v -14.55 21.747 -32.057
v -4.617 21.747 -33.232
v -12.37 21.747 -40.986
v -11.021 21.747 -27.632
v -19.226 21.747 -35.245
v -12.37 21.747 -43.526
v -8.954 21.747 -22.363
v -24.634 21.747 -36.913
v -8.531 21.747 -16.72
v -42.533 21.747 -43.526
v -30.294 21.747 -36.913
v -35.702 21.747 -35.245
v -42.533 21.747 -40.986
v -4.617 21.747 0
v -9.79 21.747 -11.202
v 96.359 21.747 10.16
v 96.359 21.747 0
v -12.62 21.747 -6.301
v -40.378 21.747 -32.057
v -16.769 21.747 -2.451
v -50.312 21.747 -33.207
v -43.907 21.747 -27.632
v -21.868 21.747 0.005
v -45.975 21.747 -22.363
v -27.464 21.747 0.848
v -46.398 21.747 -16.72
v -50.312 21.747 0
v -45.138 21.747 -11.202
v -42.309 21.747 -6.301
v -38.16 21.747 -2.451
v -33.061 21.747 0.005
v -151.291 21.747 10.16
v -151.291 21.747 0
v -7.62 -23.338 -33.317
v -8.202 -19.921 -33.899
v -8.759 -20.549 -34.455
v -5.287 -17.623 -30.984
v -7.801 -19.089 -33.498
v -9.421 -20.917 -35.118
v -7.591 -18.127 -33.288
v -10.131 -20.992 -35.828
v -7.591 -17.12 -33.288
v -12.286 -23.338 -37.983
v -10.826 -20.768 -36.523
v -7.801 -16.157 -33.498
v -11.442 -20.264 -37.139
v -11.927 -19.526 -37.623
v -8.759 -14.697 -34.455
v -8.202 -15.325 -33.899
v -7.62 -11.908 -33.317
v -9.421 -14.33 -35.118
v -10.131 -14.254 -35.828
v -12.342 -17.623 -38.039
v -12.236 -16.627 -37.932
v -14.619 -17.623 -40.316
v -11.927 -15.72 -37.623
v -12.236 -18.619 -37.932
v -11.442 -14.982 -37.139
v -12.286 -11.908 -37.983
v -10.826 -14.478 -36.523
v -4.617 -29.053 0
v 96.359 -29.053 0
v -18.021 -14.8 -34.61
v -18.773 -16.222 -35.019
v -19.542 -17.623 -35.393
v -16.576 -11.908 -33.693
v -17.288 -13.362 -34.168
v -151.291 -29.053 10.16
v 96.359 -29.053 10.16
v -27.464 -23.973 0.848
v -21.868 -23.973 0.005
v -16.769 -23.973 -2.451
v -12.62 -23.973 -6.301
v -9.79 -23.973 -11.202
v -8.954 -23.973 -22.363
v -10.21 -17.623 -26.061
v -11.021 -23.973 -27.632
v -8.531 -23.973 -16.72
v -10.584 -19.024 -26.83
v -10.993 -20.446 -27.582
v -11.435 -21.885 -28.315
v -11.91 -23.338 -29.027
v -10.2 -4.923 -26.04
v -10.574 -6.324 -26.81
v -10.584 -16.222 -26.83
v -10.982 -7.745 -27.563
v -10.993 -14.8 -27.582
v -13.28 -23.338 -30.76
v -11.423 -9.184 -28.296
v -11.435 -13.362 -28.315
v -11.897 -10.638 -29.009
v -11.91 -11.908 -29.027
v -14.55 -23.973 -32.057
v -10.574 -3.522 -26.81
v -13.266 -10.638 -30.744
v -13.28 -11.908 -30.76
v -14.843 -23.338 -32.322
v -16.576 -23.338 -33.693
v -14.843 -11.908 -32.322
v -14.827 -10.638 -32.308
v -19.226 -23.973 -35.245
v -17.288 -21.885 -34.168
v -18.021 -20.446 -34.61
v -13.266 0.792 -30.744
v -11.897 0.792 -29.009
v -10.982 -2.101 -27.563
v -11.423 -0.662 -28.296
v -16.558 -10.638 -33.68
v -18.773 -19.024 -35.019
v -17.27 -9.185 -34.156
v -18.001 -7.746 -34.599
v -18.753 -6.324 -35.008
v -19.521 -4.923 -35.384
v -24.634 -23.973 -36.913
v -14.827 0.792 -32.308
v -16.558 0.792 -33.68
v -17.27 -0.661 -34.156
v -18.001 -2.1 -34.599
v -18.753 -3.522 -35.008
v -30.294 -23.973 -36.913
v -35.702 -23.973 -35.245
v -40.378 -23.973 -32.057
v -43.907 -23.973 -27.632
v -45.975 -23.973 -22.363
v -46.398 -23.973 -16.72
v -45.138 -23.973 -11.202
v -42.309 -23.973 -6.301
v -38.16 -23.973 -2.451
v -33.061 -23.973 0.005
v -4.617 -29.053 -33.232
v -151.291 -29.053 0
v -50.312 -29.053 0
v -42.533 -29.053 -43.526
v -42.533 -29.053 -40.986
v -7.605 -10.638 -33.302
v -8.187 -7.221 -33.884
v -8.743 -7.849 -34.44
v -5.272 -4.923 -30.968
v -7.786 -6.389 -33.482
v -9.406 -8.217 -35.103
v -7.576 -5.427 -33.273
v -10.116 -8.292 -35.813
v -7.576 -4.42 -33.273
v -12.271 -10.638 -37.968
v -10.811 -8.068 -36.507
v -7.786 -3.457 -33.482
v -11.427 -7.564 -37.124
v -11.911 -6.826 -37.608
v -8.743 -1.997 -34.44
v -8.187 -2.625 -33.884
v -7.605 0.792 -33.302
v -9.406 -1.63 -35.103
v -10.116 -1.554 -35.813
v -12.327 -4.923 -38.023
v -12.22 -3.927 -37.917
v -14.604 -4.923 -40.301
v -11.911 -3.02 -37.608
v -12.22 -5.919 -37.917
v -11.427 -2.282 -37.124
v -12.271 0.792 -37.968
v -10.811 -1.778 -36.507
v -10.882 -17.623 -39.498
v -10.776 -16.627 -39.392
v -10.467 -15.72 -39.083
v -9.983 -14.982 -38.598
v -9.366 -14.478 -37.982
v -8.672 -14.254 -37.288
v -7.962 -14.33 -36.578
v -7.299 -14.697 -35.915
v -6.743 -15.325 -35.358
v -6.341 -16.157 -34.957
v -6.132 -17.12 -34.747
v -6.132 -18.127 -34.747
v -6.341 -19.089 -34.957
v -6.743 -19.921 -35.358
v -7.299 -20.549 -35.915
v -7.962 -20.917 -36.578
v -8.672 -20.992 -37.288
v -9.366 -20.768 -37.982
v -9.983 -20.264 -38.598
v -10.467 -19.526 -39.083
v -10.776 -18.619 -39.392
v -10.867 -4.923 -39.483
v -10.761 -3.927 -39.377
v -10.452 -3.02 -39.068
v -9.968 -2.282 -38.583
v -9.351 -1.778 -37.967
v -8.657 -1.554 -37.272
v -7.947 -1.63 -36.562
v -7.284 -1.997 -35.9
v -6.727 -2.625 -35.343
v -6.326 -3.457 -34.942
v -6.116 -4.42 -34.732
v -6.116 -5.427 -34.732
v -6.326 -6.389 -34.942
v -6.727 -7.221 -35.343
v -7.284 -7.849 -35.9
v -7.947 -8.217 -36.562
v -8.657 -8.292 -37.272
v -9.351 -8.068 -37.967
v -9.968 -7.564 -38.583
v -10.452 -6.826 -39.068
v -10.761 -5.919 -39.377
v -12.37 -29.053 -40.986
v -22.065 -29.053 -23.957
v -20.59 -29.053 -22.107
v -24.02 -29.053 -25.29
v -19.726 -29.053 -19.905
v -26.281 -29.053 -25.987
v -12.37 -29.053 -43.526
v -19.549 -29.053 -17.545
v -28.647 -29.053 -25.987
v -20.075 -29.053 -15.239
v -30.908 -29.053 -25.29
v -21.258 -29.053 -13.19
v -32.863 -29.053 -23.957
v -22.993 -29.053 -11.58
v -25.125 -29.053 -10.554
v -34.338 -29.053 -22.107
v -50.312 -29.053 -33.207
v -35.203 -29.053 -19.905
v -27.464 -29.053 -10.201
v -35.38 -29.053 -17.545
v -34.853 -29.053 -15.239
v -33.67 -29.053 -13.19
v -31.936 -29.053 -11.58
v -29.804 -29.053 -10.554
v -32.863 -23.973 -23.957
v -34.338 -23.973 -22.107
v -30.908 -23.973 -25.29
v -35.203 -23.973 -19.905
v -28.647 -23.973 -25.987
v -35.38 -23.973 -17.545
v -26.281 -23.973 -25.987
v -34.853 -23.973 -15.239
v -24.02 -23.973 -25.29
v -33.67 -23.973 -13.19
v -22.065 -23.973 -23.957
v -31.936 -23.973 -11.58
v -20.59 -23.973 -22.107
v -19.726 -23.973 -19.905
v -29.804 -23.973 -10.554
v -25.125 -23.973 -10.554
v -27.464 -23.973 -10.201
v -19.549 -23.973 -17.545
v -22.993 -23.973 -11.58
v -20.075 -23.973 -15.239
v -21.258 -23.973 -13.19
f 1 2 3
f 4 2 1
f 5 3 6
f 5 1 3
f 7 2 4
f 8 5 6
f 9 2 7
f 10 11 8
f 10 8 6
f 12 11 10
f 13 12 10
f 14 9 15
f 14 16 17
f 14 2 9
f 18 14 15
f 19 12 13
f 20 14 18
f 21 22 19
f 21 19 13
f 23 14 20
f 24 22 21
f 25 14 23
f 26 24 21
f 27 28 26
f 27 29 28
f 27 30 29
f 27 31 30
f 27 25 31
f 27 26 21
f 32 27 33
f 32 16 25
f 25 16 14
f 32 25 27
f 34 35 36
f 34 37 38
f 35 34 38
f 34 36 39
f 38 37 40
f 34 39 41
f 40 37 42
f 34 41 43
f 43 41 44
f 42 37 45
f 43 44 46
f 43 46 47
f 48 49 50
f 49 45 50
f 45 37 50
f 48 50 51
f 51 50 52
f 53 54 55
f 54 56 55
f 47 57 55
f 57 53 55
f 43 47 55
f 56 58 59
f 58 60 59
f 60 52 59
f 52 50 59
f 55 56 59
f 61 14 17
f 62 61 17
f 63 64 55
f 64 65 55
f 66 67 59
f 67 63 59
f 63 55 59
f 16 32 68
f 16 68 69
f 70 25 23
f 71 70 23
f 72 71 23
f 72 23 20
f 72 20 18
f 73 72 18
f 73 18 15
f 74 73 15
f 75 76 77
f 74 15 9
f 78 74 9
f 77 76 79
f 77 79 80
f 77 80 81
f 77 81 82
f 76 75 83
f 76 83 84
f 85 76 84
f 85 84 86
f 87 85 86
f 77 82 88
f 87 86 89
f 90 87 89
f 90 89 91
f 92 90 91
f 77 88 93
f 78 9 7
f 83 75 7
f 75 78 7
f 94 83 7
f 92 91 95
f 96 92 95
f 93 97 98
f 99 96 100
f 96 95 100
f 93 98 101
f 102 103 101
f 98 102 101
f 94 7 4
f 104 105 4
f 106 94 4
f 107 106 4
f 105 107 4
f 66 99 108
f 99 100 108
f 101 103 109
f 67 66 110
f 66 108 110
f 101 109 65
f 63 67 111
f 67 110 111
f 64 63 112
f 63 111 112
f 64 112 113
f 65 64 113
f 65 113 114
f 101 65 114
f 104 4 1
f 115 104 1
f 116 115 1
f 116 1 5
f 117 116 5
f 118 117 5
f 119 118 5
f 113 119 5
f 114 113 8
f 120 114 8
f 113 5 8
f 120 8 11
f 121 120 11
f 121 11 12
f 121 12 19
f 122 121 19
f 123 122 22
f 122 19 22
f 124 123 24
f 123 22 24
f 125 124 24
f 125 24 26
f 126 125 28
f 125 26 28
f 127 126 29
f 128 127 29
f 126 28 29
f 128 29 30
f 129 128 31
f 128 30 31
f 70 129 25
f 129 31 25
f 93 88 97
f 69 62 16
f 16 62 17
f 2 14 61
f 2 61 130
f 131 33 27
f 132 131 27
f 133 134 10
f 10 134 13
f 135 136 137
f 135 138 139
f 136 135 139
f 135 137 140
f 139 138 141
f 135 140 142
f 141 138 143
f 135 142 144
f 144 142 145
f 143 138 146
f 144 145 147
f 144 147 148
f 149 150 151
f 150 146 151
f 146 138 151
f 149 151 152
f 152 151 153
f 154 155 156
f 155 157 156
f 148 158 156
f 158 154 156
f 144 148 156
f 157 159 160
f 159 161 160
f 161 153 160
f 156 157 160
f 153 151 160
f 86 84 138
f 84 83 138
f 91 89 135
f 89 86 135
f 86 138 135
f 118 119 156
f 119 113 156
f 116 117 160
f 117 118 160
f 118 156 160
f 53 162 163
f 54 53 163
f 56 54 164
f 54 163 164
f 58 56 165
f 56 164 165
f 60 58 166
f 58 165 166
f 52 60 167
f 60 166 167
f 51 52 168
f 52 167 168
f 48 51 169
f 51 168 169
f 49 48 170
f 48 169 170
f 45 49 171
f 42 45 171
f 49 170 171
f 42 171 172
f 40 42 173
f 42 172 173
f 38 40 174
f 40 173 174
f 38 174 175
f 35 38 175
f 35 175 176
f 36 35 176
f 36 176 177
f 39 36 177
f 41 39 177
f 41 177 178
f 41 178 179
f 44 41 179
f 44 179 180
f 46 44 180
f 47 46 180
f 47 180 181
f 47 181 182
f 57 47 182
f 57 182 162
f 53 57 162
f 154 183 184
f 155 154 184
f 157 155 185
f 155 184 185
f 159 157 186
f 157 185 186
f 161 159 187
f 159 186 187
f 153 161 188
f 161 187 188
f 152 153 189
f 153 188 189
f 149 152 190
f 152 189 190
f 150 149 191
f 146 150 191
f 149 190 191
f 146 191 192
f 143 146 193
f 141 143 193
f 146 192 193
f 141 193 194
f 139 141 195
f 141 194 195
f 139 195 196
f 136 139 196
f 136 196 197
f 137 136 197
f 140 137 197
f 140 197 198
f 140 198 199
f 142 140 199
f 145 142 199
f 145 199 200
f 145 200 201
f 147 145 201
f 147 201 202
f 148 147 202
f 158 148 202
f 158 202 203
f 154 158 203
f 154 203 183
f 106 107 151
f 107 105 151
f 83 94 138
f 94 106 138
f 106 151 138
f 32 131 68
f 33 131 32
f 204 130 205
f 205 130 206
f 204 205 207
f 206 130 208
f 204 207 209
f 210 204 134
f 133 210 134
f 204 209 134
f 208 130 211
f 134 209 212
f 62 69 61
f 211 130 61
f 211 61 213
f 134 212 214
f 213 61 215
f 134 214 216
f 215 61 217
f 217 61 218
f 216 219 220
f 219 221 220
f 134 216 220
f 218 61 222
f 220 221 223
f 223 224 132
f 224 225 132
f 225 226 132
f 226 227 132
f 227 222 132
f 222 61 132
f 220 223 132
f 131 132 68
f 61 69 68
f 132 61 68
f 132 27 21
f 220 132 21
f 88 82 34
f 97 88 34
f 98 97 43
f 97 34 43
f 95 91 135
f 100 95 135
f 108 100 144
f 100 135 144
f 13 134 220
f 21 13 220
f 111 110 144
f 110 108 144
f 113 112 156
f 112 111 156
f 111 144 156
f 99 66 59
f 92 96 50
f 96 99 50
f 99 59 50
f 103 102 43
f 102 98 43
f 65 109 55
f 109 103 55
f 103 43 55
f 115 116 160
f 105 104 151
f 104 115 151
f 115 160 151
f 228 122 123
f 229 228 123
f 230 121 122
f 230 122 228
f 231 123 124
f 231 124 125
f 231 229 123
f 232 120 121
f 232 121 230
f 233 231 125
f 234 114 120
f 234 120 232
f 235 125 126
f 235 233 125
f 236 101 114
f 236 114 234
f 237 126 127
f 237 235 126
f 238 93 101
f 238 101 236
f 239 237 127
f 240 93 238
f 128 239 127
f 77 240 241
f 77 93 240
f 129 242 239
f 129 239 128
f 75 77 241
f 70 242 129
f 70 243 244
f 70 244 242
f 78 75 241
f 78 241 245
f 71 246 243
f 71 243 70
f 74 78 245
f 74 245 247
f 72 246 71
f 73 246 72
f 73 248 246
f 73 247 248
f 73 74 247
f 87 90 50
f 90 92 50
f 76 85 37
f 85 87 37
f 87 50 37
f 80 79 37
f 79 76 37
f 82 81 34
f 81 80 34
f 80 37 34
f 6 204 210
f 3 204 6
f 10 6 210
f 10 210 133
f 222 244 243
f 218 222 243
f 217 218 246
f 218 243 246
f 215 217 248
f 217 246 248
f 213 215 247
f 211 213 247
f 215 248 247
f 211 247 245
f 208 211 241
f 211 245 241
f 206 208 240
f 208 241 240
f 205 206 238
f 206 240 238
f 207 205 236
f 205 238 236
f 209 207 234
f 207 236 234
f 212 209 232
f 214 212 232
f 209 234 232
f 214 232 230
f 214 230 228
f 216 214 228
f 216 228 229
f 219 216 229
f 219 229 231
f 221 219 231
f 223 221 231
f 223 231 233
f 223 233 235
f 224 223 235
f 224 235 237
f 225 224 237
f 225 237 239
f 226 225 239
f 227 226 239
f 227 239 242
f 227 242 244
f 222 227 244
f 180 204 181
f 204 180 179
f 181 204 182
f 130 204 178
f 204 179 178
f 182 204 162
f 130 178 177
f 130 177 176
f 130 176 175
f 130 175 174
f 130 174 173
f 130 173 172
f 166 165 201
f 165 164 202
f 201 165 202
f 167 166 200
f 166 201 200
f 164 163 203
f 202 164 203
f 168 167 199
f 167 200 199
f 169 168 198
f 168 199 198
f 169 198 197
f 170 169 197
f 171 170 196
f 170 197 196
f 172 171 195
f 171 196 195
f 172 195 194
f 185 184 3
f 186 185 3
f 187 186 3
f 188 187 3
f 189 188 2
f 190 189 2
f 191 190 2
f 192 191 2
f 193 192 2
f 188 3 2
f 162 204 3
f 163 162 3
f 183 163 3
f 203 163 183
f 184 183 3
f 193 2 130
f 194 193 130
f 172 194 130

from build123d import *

# Parameters (mm, degrees)
SKETCH1_W                           = 247.65
SKETCH1_H                           = 50.8
BOSS_EXTRUDE1_DEPTH                 = 10.16
CUT_EXTRUDE1_DEPTH                  = 160.914701011
CUT_EXTRUDE1_DEPTH_BACK             = 160.914701011
SKETCH7_R                           = 22.847252038
BOSS_EXTRUDE2_DEPTH                 = 50.8
SKETCH8_R                           = 18.9865
CUT_EXTRUDE2_DEPTH                  = 45.72
SKETCH9_R                           = 7.9375
CUT_EXTRUDE3_DEPTH                  = 164.275821461
BOSS_EXTRUDE3_DEPTH                 = 50.8
BOSS_EXTRUDE4_START                 = -50.8
BOSS_EXTRUDE4_DEPTH                 = 50.8
BOSS_EXTRUDE5_START                 = -50.8
BOSS_EXTRUDE5_DEPTH                 = 50.8
SKETCH22_W                          = 30.1625
SKETCH22_H                          = 50.8
BOSS_EXTRUDE6_DEPTH                 = 2.54
CUT_EXTRUDE4_DEPTH                  = 166.420598915
TAP_DRILL_FOR_1_4_HELICOIL1_REACH   = 172.648
TAP_DRILL_FOR_1_4_HELICOIL1_BORE_R  = 3.3782
CUT_EXTRUDE5_DEPTH                  = 5.55625
CUT_EXTRUDE5_DIRECTION_2_REACH      = 168.46
CUT_EXTRUDE5_DIRECTION_2_END_RADIUS = 18.9865


with BuildPart() as part:
    # Sketch1 → Boss-Extrude1 (new body)
    with BuildSketch(Plane.XY):
        with Locations((-27.465601161, -3.653036721)):
            Rectangle(SKETCH1_W, SKETCH1_H)
    extrude(amount=BOSS_EXTRUDE1_DEPTH)

    # Sketch6 → Cut-Extrude1 (cut, two sides: drawn at the far end of the back side and taken through both)
    with BuildSketch(Plane(origin=(0, 21.746963279, 0), x_dir=(1, 0, 0), z_dir=(0, 1, 0)).offset(-CUT_EXTRUDE1_DEPTH_BACK)):
        with BuildLine():
            Line((211.371578383, 140.927334364), (-20.861601161, 0))
            ThreePointArc((-20.861601161, 0), (-27.465601161, -1.847030056), (-34.069601161, 0))
            Line((-34.069601161, 0), (-266.302780705, 140.927334364))
            Line((-266.302780705, 140.927334364), (-266.302780705, 684.223803161))
            Line((-266.302780705, 684.223803161), (211.371578383, 684.223803161))
            Line((211.371578383, 684.223803161), (211.371578383, 140.927334364))
        make_face()
    extrude(amount=CUT_EXTRUDE1_DEPTH + CUT_EXTRUDE1_DEPTH_BACK, mode=Mode.SUBTRACT)

    # Sketch7 → Boss-Extrude2 (add, through all)
    with BuildSketch(Plane(origin=(0, 21.746963279, 0), x_dir=(1, 0, 0), z_dir=(0, 1, 0))):
        with Locations((-27.464264218, 18.13847077)):
            Circle(SKETCH7_R)
    extrude(amount=-BOSS_EXTRUDE2_DEPTH)

    # Sketch8 → Cut-Extrude2 (cut)
    with BuildSketch(Plane(origin=(0, 21.746963279, 0), x_dir=(1, 0, 0), z_dir=(0, 1, 0))):
        with Locations(Location((-27.464264218, 18.13847077, 0), (0, 0, 270))):
            Circle(SKETCH8_R)
    extrude(amount=-CUT_EXTRUDE2_DEPTH, mode=Mode.SUBTRACT)

    # Sketch9 → Cut-Extrude3 (cut, through all)
    with BuildSketch(Plane(origin=(0, -23.973036721, 0), x_dir=(1, 0, 0), z_dir=(0, 1, 0))):
        with Locations(Location((-27.464264218, 18.13847077, 0), (0, 0, 270))):
            Circle(SKETCH9_R)
    extrude(amount=-CUT_EXTRUDE3_DEPTH, mode=Mode.SUBTRACT)

    # Sketch12 → Boss-Extrude3 (add)
    with BuildSketch(Plane(origin=(0, 21.746963279, 0), x_dir=(1, 0, 0), z_dir=(0, 1, 0))):
        with BuildLine():
            Line((-4.61701218, 18.13847077), (-4.61701218, 0))
            Line((-4.61701218, 0), (-13.572079227, 0))
            ThreePointArc((-13.572079227, 0), (-6.977742093, 8.024157302), (-4.61701218, 18.13847077))
        make_face()
        with BuildLine():
            Line((-50.311516256, 18.13847077), (-50.311516256, 0))
            Line((-50.311516256, 0), (-41.356449209, 0))
            ThreePointArc((-41.356449209, 0), (-47.950786342, 8.024157302), (-50.311516256, 18.13847077))
        make_face()
    extrude(amount=-BOSS_EXTRUDE3_DEPTH)

    # Sketch16 → Boss-Extrude4 (add)
    with BuildSketch(Plane.XZ.offset(29.053036721).offset(BOSS_EXTRUDE4_START)):
        with BuildLine():
            Line((-50.311516256, -18.13847077), (-50.311516256, -40.985722808))
            Line((-50.311516256, -40.985722808), (-27.464264218, -40.985722808))
            ThreePointArc((-27.464264218, -40.985722808), (-43.619711065, -34.293917617), (-50.311516256, -18.13847077))
        make_face()
    extrude(amount=BOSS_EXTRUDE4_DEPTH)

    # Sketch18 → Boss-Extrude5 (add)
    with BuildSketch(Plane.XZ.offset(29.053036721).offset(BOSS_EXTRUDE5_START)):
        with BuildLine():
            Line((-4.61701218, -18.13847077), (-4.61701218, -40.985722808))
            Line((-4.61701218, -40.985722808), (-27.464264218, -40.985722808))
            ThreePointArc((-27.464264218, -40.985722808), (-11.30881737, -34.293917617), (-4.61701218, -18.13847077))
        make_face()
    extrude(amount=BOSS_EXTRUDE5_DEPTH)

    # Sketch22 → Boss-Extrude6 (add)
    with BuildSketch(Plane(origin=(0, 0, -40.985722808), x_dir=(-1, 0, 0), z_dir=(0, 0, -1))):
        with Locations((27.451516256, -3.653036721)):
            Rectangle(SKETCH22_W, SKETCH22_H)
    extrude(amount=BOSS_EXTRUDE6_DEPTH)

    # Sketch23 → Cut-Extrude4 (cut, through all)
    with BuildSketch(Plane(origin=(0, 21.746963279, 0), x_dir=(1, 0, 0), z_dir=(0, 1, 0))):
        Polygon((-42.532766256, 40.985722808), (-50.311516256, 33.206972808), (-50.311516256, 40.985722808), align=None)
        Polygon((-12.370266256, 40.985722808), (-4.61701218, 33.232468732), (-4.61701218, 40.985722808), align=None)
    extrude(amount=-CUT_EXTRUDE4_DEPTH, mode=Mode.SUBTRACT)

    # Tap Drill for 1/4 Helicoil1 bore → Tap Drill for 1/4 Helicoil1 (cut, up to next)
    with BuildSketch(Plane(origin=(14.307728276, 0, -14.307728276), x_dir=(-0.7071067811865561, 0, -0.7071067811865389), z_dir=(0.7071067811865389, 0, -0.7071067811865561)), mode=Mode.PRIVATE) as tap_drill_for_1_4_helicoil1_sk1:
        with Locations((32.224624617, -4.923054714)):
            Circle(TAP_DRILL_FOR_1_4_HELICOIL1_BORE_R)
    tap_drill_for_1_4_helicoil1_tool1 = extrude(tap_drill_for_1_4_helicoil1_sk1.sketch, amount=-TAP_DRILL_FOR_1_4_HELICOIL1_REACH, mode=Mode.PRIVATE) & part.part
    # Tap Drill for 1/4 Helicoil1 bore → Tap Drill for 1/4 Helicoil1 (cut, up to next)
    with BuildSketch(Plane(origin=(14.307728276, 0, -14.307728276), x_dir=(-0.7071067811865561, 0, -0.7071067811865389), z_dir=(0.7071067811865389, 0, -0.7071067811865561)), mode=Mode.PRIVATE) as tap_drill_for_1_4_helicoil1_sk2:
        with Locations((32.24600315, -17.623036721)):
            Circle(TAP_DRILL_FOR_1_4_HELICOIL1_BORE_R)
    tap_drill_for_1_4_helicoil1_tool2 = extrude(tap_drill_for_1_4_helicoil1_sk2.sketch, amount=-TAP_DRILL_FOR_1_4_HELICOIL1_REACH, mode=Mode.PRIVATE) & part.part
    add(tap_drill_for_1_4_helicoil1_tool1.solids().sort_by_distance((-8.478522, -4.923055, -37.093979))[0], mode=Mode.SUBTRACT)
    add(tap_drill_for_1_4_helicoil1_tool2.solids().sort_by_distance((-8.493639, -17.623037, -37.109096))[0], mode=Mode.SUBTRACT)

    # Sketch28 → Cut-Extrude5 (cut)
    with BuildSketch(Plane(origin=(8.919574603, 0, -8.919574603), x_dir=(-0.7071067811865561, 0, -0.7071067811865389), z_dir=(0.7071067811865389, 0, -0.7071067811865561))):
        Polygon((28.946446362, -23.338036721), (35.545559939, -23.338036721), (38.845116727, -17.623036721), (35.545559939, -11.908036721), (28.946446362, -11.908036721), (25.646889574, -17.623036721), align=None)
        Polygon((38.823738194, -4.923054714), (35.524181405, 0.791945286), (28.925067829, 0.791945286), (25.62551104, -4.923054714), (28.925067829, -10.638054714), (35.524181405, -10.638054714), align=None)
    extrude(amount=CUT_EXTRUDE5_DEPTH, mode=Mode.SUBTRACT)

    # Cut-Extrude5 direction 2: up to this cylinder (the profile starts outside it)
    cut_extrude5_direction_2_end = Plane(origin=(-27.464264218, -11.273046, -18.13847077), z_dir=(0, 1, 0)) * Cylinder(CUT_EXTRUDE5_DIRECTION_2_END_RADIUS, 388.592982, mode=Mode.PRIVATE)
    # Sketch28 → Cut-Extrude5 direction 2 (cut, up to the surface)
    with BuildSketch(Plane(origin=(8.919574603, 0, -8.919574603), x_dir=(-0.7071067811865561, 0, -0.7071067811865389), z_dir=(0.7071067811865389, 0, -0.7071067811865561)), mode=Mode.PRIVATE) as cut_extrude5_direction_2_sk1:
        Polygon((28.946446362, -23.338036721), (35.545559939, -23.338036721), (38.845116727, -17.623036721), (35.545559939, -11.908036721), (28.946446362, -11.908036721), (25.646889574, -17.623036721), align=None)
    cut_extrude5_direction_2_tool1 = extrude(cut_extrude5_direction_2_sk1.sketch, amount=-CUT_EXTRUDE5_DIRECTION_2_REACH, mode=Mode.PRIVATE) - cut_extrude5_direction_2_end
    add(cut_extrude5_direction_2_tool1.solids().sort_by_distance((-13.881793, -17.623037, -31.720942))[0], mode=Mode.SUBTRACT)
    # Sketch28 → Cut-Extrude5 direction 2 (cut, up to the surface)
    with BuildSketch(Plane(origin=(8.919574603, 0, -8.919574603), x_dir=(-0.7071067811865561, 0, -0.7071067811865389), z_dir=(0.7071067811865389, 0, -0.7071067811865561)), mode=Mode.PRIVATE) as cut_extrude5_direction_2_sk2:
        Polygon((38.823738194, -4.923054714), (35.524181405, 0.791945286), (28.925067829, 0.791945286), (25.62551104, -4.923054714), (28.925067829, -10.638054714), (35.524181405, -10.638054714), align=None)
    cut_extrude5_direction_2_tool2 = extrude(cut_extrude5_direction_2_sk2.sketch, amount=-CUT_EXTRUDE5_DIRECTION_2_REACH, mode=Mode.PRIVATE) - cut_extrude5_direction_2_end
    add(cut_extrude5_direction_2_tool2.solids().sort_by_distance((-13.866676, -4.923055, -31.705825))[0], mode=Mode.SUBTRACT)


solid = part.part
